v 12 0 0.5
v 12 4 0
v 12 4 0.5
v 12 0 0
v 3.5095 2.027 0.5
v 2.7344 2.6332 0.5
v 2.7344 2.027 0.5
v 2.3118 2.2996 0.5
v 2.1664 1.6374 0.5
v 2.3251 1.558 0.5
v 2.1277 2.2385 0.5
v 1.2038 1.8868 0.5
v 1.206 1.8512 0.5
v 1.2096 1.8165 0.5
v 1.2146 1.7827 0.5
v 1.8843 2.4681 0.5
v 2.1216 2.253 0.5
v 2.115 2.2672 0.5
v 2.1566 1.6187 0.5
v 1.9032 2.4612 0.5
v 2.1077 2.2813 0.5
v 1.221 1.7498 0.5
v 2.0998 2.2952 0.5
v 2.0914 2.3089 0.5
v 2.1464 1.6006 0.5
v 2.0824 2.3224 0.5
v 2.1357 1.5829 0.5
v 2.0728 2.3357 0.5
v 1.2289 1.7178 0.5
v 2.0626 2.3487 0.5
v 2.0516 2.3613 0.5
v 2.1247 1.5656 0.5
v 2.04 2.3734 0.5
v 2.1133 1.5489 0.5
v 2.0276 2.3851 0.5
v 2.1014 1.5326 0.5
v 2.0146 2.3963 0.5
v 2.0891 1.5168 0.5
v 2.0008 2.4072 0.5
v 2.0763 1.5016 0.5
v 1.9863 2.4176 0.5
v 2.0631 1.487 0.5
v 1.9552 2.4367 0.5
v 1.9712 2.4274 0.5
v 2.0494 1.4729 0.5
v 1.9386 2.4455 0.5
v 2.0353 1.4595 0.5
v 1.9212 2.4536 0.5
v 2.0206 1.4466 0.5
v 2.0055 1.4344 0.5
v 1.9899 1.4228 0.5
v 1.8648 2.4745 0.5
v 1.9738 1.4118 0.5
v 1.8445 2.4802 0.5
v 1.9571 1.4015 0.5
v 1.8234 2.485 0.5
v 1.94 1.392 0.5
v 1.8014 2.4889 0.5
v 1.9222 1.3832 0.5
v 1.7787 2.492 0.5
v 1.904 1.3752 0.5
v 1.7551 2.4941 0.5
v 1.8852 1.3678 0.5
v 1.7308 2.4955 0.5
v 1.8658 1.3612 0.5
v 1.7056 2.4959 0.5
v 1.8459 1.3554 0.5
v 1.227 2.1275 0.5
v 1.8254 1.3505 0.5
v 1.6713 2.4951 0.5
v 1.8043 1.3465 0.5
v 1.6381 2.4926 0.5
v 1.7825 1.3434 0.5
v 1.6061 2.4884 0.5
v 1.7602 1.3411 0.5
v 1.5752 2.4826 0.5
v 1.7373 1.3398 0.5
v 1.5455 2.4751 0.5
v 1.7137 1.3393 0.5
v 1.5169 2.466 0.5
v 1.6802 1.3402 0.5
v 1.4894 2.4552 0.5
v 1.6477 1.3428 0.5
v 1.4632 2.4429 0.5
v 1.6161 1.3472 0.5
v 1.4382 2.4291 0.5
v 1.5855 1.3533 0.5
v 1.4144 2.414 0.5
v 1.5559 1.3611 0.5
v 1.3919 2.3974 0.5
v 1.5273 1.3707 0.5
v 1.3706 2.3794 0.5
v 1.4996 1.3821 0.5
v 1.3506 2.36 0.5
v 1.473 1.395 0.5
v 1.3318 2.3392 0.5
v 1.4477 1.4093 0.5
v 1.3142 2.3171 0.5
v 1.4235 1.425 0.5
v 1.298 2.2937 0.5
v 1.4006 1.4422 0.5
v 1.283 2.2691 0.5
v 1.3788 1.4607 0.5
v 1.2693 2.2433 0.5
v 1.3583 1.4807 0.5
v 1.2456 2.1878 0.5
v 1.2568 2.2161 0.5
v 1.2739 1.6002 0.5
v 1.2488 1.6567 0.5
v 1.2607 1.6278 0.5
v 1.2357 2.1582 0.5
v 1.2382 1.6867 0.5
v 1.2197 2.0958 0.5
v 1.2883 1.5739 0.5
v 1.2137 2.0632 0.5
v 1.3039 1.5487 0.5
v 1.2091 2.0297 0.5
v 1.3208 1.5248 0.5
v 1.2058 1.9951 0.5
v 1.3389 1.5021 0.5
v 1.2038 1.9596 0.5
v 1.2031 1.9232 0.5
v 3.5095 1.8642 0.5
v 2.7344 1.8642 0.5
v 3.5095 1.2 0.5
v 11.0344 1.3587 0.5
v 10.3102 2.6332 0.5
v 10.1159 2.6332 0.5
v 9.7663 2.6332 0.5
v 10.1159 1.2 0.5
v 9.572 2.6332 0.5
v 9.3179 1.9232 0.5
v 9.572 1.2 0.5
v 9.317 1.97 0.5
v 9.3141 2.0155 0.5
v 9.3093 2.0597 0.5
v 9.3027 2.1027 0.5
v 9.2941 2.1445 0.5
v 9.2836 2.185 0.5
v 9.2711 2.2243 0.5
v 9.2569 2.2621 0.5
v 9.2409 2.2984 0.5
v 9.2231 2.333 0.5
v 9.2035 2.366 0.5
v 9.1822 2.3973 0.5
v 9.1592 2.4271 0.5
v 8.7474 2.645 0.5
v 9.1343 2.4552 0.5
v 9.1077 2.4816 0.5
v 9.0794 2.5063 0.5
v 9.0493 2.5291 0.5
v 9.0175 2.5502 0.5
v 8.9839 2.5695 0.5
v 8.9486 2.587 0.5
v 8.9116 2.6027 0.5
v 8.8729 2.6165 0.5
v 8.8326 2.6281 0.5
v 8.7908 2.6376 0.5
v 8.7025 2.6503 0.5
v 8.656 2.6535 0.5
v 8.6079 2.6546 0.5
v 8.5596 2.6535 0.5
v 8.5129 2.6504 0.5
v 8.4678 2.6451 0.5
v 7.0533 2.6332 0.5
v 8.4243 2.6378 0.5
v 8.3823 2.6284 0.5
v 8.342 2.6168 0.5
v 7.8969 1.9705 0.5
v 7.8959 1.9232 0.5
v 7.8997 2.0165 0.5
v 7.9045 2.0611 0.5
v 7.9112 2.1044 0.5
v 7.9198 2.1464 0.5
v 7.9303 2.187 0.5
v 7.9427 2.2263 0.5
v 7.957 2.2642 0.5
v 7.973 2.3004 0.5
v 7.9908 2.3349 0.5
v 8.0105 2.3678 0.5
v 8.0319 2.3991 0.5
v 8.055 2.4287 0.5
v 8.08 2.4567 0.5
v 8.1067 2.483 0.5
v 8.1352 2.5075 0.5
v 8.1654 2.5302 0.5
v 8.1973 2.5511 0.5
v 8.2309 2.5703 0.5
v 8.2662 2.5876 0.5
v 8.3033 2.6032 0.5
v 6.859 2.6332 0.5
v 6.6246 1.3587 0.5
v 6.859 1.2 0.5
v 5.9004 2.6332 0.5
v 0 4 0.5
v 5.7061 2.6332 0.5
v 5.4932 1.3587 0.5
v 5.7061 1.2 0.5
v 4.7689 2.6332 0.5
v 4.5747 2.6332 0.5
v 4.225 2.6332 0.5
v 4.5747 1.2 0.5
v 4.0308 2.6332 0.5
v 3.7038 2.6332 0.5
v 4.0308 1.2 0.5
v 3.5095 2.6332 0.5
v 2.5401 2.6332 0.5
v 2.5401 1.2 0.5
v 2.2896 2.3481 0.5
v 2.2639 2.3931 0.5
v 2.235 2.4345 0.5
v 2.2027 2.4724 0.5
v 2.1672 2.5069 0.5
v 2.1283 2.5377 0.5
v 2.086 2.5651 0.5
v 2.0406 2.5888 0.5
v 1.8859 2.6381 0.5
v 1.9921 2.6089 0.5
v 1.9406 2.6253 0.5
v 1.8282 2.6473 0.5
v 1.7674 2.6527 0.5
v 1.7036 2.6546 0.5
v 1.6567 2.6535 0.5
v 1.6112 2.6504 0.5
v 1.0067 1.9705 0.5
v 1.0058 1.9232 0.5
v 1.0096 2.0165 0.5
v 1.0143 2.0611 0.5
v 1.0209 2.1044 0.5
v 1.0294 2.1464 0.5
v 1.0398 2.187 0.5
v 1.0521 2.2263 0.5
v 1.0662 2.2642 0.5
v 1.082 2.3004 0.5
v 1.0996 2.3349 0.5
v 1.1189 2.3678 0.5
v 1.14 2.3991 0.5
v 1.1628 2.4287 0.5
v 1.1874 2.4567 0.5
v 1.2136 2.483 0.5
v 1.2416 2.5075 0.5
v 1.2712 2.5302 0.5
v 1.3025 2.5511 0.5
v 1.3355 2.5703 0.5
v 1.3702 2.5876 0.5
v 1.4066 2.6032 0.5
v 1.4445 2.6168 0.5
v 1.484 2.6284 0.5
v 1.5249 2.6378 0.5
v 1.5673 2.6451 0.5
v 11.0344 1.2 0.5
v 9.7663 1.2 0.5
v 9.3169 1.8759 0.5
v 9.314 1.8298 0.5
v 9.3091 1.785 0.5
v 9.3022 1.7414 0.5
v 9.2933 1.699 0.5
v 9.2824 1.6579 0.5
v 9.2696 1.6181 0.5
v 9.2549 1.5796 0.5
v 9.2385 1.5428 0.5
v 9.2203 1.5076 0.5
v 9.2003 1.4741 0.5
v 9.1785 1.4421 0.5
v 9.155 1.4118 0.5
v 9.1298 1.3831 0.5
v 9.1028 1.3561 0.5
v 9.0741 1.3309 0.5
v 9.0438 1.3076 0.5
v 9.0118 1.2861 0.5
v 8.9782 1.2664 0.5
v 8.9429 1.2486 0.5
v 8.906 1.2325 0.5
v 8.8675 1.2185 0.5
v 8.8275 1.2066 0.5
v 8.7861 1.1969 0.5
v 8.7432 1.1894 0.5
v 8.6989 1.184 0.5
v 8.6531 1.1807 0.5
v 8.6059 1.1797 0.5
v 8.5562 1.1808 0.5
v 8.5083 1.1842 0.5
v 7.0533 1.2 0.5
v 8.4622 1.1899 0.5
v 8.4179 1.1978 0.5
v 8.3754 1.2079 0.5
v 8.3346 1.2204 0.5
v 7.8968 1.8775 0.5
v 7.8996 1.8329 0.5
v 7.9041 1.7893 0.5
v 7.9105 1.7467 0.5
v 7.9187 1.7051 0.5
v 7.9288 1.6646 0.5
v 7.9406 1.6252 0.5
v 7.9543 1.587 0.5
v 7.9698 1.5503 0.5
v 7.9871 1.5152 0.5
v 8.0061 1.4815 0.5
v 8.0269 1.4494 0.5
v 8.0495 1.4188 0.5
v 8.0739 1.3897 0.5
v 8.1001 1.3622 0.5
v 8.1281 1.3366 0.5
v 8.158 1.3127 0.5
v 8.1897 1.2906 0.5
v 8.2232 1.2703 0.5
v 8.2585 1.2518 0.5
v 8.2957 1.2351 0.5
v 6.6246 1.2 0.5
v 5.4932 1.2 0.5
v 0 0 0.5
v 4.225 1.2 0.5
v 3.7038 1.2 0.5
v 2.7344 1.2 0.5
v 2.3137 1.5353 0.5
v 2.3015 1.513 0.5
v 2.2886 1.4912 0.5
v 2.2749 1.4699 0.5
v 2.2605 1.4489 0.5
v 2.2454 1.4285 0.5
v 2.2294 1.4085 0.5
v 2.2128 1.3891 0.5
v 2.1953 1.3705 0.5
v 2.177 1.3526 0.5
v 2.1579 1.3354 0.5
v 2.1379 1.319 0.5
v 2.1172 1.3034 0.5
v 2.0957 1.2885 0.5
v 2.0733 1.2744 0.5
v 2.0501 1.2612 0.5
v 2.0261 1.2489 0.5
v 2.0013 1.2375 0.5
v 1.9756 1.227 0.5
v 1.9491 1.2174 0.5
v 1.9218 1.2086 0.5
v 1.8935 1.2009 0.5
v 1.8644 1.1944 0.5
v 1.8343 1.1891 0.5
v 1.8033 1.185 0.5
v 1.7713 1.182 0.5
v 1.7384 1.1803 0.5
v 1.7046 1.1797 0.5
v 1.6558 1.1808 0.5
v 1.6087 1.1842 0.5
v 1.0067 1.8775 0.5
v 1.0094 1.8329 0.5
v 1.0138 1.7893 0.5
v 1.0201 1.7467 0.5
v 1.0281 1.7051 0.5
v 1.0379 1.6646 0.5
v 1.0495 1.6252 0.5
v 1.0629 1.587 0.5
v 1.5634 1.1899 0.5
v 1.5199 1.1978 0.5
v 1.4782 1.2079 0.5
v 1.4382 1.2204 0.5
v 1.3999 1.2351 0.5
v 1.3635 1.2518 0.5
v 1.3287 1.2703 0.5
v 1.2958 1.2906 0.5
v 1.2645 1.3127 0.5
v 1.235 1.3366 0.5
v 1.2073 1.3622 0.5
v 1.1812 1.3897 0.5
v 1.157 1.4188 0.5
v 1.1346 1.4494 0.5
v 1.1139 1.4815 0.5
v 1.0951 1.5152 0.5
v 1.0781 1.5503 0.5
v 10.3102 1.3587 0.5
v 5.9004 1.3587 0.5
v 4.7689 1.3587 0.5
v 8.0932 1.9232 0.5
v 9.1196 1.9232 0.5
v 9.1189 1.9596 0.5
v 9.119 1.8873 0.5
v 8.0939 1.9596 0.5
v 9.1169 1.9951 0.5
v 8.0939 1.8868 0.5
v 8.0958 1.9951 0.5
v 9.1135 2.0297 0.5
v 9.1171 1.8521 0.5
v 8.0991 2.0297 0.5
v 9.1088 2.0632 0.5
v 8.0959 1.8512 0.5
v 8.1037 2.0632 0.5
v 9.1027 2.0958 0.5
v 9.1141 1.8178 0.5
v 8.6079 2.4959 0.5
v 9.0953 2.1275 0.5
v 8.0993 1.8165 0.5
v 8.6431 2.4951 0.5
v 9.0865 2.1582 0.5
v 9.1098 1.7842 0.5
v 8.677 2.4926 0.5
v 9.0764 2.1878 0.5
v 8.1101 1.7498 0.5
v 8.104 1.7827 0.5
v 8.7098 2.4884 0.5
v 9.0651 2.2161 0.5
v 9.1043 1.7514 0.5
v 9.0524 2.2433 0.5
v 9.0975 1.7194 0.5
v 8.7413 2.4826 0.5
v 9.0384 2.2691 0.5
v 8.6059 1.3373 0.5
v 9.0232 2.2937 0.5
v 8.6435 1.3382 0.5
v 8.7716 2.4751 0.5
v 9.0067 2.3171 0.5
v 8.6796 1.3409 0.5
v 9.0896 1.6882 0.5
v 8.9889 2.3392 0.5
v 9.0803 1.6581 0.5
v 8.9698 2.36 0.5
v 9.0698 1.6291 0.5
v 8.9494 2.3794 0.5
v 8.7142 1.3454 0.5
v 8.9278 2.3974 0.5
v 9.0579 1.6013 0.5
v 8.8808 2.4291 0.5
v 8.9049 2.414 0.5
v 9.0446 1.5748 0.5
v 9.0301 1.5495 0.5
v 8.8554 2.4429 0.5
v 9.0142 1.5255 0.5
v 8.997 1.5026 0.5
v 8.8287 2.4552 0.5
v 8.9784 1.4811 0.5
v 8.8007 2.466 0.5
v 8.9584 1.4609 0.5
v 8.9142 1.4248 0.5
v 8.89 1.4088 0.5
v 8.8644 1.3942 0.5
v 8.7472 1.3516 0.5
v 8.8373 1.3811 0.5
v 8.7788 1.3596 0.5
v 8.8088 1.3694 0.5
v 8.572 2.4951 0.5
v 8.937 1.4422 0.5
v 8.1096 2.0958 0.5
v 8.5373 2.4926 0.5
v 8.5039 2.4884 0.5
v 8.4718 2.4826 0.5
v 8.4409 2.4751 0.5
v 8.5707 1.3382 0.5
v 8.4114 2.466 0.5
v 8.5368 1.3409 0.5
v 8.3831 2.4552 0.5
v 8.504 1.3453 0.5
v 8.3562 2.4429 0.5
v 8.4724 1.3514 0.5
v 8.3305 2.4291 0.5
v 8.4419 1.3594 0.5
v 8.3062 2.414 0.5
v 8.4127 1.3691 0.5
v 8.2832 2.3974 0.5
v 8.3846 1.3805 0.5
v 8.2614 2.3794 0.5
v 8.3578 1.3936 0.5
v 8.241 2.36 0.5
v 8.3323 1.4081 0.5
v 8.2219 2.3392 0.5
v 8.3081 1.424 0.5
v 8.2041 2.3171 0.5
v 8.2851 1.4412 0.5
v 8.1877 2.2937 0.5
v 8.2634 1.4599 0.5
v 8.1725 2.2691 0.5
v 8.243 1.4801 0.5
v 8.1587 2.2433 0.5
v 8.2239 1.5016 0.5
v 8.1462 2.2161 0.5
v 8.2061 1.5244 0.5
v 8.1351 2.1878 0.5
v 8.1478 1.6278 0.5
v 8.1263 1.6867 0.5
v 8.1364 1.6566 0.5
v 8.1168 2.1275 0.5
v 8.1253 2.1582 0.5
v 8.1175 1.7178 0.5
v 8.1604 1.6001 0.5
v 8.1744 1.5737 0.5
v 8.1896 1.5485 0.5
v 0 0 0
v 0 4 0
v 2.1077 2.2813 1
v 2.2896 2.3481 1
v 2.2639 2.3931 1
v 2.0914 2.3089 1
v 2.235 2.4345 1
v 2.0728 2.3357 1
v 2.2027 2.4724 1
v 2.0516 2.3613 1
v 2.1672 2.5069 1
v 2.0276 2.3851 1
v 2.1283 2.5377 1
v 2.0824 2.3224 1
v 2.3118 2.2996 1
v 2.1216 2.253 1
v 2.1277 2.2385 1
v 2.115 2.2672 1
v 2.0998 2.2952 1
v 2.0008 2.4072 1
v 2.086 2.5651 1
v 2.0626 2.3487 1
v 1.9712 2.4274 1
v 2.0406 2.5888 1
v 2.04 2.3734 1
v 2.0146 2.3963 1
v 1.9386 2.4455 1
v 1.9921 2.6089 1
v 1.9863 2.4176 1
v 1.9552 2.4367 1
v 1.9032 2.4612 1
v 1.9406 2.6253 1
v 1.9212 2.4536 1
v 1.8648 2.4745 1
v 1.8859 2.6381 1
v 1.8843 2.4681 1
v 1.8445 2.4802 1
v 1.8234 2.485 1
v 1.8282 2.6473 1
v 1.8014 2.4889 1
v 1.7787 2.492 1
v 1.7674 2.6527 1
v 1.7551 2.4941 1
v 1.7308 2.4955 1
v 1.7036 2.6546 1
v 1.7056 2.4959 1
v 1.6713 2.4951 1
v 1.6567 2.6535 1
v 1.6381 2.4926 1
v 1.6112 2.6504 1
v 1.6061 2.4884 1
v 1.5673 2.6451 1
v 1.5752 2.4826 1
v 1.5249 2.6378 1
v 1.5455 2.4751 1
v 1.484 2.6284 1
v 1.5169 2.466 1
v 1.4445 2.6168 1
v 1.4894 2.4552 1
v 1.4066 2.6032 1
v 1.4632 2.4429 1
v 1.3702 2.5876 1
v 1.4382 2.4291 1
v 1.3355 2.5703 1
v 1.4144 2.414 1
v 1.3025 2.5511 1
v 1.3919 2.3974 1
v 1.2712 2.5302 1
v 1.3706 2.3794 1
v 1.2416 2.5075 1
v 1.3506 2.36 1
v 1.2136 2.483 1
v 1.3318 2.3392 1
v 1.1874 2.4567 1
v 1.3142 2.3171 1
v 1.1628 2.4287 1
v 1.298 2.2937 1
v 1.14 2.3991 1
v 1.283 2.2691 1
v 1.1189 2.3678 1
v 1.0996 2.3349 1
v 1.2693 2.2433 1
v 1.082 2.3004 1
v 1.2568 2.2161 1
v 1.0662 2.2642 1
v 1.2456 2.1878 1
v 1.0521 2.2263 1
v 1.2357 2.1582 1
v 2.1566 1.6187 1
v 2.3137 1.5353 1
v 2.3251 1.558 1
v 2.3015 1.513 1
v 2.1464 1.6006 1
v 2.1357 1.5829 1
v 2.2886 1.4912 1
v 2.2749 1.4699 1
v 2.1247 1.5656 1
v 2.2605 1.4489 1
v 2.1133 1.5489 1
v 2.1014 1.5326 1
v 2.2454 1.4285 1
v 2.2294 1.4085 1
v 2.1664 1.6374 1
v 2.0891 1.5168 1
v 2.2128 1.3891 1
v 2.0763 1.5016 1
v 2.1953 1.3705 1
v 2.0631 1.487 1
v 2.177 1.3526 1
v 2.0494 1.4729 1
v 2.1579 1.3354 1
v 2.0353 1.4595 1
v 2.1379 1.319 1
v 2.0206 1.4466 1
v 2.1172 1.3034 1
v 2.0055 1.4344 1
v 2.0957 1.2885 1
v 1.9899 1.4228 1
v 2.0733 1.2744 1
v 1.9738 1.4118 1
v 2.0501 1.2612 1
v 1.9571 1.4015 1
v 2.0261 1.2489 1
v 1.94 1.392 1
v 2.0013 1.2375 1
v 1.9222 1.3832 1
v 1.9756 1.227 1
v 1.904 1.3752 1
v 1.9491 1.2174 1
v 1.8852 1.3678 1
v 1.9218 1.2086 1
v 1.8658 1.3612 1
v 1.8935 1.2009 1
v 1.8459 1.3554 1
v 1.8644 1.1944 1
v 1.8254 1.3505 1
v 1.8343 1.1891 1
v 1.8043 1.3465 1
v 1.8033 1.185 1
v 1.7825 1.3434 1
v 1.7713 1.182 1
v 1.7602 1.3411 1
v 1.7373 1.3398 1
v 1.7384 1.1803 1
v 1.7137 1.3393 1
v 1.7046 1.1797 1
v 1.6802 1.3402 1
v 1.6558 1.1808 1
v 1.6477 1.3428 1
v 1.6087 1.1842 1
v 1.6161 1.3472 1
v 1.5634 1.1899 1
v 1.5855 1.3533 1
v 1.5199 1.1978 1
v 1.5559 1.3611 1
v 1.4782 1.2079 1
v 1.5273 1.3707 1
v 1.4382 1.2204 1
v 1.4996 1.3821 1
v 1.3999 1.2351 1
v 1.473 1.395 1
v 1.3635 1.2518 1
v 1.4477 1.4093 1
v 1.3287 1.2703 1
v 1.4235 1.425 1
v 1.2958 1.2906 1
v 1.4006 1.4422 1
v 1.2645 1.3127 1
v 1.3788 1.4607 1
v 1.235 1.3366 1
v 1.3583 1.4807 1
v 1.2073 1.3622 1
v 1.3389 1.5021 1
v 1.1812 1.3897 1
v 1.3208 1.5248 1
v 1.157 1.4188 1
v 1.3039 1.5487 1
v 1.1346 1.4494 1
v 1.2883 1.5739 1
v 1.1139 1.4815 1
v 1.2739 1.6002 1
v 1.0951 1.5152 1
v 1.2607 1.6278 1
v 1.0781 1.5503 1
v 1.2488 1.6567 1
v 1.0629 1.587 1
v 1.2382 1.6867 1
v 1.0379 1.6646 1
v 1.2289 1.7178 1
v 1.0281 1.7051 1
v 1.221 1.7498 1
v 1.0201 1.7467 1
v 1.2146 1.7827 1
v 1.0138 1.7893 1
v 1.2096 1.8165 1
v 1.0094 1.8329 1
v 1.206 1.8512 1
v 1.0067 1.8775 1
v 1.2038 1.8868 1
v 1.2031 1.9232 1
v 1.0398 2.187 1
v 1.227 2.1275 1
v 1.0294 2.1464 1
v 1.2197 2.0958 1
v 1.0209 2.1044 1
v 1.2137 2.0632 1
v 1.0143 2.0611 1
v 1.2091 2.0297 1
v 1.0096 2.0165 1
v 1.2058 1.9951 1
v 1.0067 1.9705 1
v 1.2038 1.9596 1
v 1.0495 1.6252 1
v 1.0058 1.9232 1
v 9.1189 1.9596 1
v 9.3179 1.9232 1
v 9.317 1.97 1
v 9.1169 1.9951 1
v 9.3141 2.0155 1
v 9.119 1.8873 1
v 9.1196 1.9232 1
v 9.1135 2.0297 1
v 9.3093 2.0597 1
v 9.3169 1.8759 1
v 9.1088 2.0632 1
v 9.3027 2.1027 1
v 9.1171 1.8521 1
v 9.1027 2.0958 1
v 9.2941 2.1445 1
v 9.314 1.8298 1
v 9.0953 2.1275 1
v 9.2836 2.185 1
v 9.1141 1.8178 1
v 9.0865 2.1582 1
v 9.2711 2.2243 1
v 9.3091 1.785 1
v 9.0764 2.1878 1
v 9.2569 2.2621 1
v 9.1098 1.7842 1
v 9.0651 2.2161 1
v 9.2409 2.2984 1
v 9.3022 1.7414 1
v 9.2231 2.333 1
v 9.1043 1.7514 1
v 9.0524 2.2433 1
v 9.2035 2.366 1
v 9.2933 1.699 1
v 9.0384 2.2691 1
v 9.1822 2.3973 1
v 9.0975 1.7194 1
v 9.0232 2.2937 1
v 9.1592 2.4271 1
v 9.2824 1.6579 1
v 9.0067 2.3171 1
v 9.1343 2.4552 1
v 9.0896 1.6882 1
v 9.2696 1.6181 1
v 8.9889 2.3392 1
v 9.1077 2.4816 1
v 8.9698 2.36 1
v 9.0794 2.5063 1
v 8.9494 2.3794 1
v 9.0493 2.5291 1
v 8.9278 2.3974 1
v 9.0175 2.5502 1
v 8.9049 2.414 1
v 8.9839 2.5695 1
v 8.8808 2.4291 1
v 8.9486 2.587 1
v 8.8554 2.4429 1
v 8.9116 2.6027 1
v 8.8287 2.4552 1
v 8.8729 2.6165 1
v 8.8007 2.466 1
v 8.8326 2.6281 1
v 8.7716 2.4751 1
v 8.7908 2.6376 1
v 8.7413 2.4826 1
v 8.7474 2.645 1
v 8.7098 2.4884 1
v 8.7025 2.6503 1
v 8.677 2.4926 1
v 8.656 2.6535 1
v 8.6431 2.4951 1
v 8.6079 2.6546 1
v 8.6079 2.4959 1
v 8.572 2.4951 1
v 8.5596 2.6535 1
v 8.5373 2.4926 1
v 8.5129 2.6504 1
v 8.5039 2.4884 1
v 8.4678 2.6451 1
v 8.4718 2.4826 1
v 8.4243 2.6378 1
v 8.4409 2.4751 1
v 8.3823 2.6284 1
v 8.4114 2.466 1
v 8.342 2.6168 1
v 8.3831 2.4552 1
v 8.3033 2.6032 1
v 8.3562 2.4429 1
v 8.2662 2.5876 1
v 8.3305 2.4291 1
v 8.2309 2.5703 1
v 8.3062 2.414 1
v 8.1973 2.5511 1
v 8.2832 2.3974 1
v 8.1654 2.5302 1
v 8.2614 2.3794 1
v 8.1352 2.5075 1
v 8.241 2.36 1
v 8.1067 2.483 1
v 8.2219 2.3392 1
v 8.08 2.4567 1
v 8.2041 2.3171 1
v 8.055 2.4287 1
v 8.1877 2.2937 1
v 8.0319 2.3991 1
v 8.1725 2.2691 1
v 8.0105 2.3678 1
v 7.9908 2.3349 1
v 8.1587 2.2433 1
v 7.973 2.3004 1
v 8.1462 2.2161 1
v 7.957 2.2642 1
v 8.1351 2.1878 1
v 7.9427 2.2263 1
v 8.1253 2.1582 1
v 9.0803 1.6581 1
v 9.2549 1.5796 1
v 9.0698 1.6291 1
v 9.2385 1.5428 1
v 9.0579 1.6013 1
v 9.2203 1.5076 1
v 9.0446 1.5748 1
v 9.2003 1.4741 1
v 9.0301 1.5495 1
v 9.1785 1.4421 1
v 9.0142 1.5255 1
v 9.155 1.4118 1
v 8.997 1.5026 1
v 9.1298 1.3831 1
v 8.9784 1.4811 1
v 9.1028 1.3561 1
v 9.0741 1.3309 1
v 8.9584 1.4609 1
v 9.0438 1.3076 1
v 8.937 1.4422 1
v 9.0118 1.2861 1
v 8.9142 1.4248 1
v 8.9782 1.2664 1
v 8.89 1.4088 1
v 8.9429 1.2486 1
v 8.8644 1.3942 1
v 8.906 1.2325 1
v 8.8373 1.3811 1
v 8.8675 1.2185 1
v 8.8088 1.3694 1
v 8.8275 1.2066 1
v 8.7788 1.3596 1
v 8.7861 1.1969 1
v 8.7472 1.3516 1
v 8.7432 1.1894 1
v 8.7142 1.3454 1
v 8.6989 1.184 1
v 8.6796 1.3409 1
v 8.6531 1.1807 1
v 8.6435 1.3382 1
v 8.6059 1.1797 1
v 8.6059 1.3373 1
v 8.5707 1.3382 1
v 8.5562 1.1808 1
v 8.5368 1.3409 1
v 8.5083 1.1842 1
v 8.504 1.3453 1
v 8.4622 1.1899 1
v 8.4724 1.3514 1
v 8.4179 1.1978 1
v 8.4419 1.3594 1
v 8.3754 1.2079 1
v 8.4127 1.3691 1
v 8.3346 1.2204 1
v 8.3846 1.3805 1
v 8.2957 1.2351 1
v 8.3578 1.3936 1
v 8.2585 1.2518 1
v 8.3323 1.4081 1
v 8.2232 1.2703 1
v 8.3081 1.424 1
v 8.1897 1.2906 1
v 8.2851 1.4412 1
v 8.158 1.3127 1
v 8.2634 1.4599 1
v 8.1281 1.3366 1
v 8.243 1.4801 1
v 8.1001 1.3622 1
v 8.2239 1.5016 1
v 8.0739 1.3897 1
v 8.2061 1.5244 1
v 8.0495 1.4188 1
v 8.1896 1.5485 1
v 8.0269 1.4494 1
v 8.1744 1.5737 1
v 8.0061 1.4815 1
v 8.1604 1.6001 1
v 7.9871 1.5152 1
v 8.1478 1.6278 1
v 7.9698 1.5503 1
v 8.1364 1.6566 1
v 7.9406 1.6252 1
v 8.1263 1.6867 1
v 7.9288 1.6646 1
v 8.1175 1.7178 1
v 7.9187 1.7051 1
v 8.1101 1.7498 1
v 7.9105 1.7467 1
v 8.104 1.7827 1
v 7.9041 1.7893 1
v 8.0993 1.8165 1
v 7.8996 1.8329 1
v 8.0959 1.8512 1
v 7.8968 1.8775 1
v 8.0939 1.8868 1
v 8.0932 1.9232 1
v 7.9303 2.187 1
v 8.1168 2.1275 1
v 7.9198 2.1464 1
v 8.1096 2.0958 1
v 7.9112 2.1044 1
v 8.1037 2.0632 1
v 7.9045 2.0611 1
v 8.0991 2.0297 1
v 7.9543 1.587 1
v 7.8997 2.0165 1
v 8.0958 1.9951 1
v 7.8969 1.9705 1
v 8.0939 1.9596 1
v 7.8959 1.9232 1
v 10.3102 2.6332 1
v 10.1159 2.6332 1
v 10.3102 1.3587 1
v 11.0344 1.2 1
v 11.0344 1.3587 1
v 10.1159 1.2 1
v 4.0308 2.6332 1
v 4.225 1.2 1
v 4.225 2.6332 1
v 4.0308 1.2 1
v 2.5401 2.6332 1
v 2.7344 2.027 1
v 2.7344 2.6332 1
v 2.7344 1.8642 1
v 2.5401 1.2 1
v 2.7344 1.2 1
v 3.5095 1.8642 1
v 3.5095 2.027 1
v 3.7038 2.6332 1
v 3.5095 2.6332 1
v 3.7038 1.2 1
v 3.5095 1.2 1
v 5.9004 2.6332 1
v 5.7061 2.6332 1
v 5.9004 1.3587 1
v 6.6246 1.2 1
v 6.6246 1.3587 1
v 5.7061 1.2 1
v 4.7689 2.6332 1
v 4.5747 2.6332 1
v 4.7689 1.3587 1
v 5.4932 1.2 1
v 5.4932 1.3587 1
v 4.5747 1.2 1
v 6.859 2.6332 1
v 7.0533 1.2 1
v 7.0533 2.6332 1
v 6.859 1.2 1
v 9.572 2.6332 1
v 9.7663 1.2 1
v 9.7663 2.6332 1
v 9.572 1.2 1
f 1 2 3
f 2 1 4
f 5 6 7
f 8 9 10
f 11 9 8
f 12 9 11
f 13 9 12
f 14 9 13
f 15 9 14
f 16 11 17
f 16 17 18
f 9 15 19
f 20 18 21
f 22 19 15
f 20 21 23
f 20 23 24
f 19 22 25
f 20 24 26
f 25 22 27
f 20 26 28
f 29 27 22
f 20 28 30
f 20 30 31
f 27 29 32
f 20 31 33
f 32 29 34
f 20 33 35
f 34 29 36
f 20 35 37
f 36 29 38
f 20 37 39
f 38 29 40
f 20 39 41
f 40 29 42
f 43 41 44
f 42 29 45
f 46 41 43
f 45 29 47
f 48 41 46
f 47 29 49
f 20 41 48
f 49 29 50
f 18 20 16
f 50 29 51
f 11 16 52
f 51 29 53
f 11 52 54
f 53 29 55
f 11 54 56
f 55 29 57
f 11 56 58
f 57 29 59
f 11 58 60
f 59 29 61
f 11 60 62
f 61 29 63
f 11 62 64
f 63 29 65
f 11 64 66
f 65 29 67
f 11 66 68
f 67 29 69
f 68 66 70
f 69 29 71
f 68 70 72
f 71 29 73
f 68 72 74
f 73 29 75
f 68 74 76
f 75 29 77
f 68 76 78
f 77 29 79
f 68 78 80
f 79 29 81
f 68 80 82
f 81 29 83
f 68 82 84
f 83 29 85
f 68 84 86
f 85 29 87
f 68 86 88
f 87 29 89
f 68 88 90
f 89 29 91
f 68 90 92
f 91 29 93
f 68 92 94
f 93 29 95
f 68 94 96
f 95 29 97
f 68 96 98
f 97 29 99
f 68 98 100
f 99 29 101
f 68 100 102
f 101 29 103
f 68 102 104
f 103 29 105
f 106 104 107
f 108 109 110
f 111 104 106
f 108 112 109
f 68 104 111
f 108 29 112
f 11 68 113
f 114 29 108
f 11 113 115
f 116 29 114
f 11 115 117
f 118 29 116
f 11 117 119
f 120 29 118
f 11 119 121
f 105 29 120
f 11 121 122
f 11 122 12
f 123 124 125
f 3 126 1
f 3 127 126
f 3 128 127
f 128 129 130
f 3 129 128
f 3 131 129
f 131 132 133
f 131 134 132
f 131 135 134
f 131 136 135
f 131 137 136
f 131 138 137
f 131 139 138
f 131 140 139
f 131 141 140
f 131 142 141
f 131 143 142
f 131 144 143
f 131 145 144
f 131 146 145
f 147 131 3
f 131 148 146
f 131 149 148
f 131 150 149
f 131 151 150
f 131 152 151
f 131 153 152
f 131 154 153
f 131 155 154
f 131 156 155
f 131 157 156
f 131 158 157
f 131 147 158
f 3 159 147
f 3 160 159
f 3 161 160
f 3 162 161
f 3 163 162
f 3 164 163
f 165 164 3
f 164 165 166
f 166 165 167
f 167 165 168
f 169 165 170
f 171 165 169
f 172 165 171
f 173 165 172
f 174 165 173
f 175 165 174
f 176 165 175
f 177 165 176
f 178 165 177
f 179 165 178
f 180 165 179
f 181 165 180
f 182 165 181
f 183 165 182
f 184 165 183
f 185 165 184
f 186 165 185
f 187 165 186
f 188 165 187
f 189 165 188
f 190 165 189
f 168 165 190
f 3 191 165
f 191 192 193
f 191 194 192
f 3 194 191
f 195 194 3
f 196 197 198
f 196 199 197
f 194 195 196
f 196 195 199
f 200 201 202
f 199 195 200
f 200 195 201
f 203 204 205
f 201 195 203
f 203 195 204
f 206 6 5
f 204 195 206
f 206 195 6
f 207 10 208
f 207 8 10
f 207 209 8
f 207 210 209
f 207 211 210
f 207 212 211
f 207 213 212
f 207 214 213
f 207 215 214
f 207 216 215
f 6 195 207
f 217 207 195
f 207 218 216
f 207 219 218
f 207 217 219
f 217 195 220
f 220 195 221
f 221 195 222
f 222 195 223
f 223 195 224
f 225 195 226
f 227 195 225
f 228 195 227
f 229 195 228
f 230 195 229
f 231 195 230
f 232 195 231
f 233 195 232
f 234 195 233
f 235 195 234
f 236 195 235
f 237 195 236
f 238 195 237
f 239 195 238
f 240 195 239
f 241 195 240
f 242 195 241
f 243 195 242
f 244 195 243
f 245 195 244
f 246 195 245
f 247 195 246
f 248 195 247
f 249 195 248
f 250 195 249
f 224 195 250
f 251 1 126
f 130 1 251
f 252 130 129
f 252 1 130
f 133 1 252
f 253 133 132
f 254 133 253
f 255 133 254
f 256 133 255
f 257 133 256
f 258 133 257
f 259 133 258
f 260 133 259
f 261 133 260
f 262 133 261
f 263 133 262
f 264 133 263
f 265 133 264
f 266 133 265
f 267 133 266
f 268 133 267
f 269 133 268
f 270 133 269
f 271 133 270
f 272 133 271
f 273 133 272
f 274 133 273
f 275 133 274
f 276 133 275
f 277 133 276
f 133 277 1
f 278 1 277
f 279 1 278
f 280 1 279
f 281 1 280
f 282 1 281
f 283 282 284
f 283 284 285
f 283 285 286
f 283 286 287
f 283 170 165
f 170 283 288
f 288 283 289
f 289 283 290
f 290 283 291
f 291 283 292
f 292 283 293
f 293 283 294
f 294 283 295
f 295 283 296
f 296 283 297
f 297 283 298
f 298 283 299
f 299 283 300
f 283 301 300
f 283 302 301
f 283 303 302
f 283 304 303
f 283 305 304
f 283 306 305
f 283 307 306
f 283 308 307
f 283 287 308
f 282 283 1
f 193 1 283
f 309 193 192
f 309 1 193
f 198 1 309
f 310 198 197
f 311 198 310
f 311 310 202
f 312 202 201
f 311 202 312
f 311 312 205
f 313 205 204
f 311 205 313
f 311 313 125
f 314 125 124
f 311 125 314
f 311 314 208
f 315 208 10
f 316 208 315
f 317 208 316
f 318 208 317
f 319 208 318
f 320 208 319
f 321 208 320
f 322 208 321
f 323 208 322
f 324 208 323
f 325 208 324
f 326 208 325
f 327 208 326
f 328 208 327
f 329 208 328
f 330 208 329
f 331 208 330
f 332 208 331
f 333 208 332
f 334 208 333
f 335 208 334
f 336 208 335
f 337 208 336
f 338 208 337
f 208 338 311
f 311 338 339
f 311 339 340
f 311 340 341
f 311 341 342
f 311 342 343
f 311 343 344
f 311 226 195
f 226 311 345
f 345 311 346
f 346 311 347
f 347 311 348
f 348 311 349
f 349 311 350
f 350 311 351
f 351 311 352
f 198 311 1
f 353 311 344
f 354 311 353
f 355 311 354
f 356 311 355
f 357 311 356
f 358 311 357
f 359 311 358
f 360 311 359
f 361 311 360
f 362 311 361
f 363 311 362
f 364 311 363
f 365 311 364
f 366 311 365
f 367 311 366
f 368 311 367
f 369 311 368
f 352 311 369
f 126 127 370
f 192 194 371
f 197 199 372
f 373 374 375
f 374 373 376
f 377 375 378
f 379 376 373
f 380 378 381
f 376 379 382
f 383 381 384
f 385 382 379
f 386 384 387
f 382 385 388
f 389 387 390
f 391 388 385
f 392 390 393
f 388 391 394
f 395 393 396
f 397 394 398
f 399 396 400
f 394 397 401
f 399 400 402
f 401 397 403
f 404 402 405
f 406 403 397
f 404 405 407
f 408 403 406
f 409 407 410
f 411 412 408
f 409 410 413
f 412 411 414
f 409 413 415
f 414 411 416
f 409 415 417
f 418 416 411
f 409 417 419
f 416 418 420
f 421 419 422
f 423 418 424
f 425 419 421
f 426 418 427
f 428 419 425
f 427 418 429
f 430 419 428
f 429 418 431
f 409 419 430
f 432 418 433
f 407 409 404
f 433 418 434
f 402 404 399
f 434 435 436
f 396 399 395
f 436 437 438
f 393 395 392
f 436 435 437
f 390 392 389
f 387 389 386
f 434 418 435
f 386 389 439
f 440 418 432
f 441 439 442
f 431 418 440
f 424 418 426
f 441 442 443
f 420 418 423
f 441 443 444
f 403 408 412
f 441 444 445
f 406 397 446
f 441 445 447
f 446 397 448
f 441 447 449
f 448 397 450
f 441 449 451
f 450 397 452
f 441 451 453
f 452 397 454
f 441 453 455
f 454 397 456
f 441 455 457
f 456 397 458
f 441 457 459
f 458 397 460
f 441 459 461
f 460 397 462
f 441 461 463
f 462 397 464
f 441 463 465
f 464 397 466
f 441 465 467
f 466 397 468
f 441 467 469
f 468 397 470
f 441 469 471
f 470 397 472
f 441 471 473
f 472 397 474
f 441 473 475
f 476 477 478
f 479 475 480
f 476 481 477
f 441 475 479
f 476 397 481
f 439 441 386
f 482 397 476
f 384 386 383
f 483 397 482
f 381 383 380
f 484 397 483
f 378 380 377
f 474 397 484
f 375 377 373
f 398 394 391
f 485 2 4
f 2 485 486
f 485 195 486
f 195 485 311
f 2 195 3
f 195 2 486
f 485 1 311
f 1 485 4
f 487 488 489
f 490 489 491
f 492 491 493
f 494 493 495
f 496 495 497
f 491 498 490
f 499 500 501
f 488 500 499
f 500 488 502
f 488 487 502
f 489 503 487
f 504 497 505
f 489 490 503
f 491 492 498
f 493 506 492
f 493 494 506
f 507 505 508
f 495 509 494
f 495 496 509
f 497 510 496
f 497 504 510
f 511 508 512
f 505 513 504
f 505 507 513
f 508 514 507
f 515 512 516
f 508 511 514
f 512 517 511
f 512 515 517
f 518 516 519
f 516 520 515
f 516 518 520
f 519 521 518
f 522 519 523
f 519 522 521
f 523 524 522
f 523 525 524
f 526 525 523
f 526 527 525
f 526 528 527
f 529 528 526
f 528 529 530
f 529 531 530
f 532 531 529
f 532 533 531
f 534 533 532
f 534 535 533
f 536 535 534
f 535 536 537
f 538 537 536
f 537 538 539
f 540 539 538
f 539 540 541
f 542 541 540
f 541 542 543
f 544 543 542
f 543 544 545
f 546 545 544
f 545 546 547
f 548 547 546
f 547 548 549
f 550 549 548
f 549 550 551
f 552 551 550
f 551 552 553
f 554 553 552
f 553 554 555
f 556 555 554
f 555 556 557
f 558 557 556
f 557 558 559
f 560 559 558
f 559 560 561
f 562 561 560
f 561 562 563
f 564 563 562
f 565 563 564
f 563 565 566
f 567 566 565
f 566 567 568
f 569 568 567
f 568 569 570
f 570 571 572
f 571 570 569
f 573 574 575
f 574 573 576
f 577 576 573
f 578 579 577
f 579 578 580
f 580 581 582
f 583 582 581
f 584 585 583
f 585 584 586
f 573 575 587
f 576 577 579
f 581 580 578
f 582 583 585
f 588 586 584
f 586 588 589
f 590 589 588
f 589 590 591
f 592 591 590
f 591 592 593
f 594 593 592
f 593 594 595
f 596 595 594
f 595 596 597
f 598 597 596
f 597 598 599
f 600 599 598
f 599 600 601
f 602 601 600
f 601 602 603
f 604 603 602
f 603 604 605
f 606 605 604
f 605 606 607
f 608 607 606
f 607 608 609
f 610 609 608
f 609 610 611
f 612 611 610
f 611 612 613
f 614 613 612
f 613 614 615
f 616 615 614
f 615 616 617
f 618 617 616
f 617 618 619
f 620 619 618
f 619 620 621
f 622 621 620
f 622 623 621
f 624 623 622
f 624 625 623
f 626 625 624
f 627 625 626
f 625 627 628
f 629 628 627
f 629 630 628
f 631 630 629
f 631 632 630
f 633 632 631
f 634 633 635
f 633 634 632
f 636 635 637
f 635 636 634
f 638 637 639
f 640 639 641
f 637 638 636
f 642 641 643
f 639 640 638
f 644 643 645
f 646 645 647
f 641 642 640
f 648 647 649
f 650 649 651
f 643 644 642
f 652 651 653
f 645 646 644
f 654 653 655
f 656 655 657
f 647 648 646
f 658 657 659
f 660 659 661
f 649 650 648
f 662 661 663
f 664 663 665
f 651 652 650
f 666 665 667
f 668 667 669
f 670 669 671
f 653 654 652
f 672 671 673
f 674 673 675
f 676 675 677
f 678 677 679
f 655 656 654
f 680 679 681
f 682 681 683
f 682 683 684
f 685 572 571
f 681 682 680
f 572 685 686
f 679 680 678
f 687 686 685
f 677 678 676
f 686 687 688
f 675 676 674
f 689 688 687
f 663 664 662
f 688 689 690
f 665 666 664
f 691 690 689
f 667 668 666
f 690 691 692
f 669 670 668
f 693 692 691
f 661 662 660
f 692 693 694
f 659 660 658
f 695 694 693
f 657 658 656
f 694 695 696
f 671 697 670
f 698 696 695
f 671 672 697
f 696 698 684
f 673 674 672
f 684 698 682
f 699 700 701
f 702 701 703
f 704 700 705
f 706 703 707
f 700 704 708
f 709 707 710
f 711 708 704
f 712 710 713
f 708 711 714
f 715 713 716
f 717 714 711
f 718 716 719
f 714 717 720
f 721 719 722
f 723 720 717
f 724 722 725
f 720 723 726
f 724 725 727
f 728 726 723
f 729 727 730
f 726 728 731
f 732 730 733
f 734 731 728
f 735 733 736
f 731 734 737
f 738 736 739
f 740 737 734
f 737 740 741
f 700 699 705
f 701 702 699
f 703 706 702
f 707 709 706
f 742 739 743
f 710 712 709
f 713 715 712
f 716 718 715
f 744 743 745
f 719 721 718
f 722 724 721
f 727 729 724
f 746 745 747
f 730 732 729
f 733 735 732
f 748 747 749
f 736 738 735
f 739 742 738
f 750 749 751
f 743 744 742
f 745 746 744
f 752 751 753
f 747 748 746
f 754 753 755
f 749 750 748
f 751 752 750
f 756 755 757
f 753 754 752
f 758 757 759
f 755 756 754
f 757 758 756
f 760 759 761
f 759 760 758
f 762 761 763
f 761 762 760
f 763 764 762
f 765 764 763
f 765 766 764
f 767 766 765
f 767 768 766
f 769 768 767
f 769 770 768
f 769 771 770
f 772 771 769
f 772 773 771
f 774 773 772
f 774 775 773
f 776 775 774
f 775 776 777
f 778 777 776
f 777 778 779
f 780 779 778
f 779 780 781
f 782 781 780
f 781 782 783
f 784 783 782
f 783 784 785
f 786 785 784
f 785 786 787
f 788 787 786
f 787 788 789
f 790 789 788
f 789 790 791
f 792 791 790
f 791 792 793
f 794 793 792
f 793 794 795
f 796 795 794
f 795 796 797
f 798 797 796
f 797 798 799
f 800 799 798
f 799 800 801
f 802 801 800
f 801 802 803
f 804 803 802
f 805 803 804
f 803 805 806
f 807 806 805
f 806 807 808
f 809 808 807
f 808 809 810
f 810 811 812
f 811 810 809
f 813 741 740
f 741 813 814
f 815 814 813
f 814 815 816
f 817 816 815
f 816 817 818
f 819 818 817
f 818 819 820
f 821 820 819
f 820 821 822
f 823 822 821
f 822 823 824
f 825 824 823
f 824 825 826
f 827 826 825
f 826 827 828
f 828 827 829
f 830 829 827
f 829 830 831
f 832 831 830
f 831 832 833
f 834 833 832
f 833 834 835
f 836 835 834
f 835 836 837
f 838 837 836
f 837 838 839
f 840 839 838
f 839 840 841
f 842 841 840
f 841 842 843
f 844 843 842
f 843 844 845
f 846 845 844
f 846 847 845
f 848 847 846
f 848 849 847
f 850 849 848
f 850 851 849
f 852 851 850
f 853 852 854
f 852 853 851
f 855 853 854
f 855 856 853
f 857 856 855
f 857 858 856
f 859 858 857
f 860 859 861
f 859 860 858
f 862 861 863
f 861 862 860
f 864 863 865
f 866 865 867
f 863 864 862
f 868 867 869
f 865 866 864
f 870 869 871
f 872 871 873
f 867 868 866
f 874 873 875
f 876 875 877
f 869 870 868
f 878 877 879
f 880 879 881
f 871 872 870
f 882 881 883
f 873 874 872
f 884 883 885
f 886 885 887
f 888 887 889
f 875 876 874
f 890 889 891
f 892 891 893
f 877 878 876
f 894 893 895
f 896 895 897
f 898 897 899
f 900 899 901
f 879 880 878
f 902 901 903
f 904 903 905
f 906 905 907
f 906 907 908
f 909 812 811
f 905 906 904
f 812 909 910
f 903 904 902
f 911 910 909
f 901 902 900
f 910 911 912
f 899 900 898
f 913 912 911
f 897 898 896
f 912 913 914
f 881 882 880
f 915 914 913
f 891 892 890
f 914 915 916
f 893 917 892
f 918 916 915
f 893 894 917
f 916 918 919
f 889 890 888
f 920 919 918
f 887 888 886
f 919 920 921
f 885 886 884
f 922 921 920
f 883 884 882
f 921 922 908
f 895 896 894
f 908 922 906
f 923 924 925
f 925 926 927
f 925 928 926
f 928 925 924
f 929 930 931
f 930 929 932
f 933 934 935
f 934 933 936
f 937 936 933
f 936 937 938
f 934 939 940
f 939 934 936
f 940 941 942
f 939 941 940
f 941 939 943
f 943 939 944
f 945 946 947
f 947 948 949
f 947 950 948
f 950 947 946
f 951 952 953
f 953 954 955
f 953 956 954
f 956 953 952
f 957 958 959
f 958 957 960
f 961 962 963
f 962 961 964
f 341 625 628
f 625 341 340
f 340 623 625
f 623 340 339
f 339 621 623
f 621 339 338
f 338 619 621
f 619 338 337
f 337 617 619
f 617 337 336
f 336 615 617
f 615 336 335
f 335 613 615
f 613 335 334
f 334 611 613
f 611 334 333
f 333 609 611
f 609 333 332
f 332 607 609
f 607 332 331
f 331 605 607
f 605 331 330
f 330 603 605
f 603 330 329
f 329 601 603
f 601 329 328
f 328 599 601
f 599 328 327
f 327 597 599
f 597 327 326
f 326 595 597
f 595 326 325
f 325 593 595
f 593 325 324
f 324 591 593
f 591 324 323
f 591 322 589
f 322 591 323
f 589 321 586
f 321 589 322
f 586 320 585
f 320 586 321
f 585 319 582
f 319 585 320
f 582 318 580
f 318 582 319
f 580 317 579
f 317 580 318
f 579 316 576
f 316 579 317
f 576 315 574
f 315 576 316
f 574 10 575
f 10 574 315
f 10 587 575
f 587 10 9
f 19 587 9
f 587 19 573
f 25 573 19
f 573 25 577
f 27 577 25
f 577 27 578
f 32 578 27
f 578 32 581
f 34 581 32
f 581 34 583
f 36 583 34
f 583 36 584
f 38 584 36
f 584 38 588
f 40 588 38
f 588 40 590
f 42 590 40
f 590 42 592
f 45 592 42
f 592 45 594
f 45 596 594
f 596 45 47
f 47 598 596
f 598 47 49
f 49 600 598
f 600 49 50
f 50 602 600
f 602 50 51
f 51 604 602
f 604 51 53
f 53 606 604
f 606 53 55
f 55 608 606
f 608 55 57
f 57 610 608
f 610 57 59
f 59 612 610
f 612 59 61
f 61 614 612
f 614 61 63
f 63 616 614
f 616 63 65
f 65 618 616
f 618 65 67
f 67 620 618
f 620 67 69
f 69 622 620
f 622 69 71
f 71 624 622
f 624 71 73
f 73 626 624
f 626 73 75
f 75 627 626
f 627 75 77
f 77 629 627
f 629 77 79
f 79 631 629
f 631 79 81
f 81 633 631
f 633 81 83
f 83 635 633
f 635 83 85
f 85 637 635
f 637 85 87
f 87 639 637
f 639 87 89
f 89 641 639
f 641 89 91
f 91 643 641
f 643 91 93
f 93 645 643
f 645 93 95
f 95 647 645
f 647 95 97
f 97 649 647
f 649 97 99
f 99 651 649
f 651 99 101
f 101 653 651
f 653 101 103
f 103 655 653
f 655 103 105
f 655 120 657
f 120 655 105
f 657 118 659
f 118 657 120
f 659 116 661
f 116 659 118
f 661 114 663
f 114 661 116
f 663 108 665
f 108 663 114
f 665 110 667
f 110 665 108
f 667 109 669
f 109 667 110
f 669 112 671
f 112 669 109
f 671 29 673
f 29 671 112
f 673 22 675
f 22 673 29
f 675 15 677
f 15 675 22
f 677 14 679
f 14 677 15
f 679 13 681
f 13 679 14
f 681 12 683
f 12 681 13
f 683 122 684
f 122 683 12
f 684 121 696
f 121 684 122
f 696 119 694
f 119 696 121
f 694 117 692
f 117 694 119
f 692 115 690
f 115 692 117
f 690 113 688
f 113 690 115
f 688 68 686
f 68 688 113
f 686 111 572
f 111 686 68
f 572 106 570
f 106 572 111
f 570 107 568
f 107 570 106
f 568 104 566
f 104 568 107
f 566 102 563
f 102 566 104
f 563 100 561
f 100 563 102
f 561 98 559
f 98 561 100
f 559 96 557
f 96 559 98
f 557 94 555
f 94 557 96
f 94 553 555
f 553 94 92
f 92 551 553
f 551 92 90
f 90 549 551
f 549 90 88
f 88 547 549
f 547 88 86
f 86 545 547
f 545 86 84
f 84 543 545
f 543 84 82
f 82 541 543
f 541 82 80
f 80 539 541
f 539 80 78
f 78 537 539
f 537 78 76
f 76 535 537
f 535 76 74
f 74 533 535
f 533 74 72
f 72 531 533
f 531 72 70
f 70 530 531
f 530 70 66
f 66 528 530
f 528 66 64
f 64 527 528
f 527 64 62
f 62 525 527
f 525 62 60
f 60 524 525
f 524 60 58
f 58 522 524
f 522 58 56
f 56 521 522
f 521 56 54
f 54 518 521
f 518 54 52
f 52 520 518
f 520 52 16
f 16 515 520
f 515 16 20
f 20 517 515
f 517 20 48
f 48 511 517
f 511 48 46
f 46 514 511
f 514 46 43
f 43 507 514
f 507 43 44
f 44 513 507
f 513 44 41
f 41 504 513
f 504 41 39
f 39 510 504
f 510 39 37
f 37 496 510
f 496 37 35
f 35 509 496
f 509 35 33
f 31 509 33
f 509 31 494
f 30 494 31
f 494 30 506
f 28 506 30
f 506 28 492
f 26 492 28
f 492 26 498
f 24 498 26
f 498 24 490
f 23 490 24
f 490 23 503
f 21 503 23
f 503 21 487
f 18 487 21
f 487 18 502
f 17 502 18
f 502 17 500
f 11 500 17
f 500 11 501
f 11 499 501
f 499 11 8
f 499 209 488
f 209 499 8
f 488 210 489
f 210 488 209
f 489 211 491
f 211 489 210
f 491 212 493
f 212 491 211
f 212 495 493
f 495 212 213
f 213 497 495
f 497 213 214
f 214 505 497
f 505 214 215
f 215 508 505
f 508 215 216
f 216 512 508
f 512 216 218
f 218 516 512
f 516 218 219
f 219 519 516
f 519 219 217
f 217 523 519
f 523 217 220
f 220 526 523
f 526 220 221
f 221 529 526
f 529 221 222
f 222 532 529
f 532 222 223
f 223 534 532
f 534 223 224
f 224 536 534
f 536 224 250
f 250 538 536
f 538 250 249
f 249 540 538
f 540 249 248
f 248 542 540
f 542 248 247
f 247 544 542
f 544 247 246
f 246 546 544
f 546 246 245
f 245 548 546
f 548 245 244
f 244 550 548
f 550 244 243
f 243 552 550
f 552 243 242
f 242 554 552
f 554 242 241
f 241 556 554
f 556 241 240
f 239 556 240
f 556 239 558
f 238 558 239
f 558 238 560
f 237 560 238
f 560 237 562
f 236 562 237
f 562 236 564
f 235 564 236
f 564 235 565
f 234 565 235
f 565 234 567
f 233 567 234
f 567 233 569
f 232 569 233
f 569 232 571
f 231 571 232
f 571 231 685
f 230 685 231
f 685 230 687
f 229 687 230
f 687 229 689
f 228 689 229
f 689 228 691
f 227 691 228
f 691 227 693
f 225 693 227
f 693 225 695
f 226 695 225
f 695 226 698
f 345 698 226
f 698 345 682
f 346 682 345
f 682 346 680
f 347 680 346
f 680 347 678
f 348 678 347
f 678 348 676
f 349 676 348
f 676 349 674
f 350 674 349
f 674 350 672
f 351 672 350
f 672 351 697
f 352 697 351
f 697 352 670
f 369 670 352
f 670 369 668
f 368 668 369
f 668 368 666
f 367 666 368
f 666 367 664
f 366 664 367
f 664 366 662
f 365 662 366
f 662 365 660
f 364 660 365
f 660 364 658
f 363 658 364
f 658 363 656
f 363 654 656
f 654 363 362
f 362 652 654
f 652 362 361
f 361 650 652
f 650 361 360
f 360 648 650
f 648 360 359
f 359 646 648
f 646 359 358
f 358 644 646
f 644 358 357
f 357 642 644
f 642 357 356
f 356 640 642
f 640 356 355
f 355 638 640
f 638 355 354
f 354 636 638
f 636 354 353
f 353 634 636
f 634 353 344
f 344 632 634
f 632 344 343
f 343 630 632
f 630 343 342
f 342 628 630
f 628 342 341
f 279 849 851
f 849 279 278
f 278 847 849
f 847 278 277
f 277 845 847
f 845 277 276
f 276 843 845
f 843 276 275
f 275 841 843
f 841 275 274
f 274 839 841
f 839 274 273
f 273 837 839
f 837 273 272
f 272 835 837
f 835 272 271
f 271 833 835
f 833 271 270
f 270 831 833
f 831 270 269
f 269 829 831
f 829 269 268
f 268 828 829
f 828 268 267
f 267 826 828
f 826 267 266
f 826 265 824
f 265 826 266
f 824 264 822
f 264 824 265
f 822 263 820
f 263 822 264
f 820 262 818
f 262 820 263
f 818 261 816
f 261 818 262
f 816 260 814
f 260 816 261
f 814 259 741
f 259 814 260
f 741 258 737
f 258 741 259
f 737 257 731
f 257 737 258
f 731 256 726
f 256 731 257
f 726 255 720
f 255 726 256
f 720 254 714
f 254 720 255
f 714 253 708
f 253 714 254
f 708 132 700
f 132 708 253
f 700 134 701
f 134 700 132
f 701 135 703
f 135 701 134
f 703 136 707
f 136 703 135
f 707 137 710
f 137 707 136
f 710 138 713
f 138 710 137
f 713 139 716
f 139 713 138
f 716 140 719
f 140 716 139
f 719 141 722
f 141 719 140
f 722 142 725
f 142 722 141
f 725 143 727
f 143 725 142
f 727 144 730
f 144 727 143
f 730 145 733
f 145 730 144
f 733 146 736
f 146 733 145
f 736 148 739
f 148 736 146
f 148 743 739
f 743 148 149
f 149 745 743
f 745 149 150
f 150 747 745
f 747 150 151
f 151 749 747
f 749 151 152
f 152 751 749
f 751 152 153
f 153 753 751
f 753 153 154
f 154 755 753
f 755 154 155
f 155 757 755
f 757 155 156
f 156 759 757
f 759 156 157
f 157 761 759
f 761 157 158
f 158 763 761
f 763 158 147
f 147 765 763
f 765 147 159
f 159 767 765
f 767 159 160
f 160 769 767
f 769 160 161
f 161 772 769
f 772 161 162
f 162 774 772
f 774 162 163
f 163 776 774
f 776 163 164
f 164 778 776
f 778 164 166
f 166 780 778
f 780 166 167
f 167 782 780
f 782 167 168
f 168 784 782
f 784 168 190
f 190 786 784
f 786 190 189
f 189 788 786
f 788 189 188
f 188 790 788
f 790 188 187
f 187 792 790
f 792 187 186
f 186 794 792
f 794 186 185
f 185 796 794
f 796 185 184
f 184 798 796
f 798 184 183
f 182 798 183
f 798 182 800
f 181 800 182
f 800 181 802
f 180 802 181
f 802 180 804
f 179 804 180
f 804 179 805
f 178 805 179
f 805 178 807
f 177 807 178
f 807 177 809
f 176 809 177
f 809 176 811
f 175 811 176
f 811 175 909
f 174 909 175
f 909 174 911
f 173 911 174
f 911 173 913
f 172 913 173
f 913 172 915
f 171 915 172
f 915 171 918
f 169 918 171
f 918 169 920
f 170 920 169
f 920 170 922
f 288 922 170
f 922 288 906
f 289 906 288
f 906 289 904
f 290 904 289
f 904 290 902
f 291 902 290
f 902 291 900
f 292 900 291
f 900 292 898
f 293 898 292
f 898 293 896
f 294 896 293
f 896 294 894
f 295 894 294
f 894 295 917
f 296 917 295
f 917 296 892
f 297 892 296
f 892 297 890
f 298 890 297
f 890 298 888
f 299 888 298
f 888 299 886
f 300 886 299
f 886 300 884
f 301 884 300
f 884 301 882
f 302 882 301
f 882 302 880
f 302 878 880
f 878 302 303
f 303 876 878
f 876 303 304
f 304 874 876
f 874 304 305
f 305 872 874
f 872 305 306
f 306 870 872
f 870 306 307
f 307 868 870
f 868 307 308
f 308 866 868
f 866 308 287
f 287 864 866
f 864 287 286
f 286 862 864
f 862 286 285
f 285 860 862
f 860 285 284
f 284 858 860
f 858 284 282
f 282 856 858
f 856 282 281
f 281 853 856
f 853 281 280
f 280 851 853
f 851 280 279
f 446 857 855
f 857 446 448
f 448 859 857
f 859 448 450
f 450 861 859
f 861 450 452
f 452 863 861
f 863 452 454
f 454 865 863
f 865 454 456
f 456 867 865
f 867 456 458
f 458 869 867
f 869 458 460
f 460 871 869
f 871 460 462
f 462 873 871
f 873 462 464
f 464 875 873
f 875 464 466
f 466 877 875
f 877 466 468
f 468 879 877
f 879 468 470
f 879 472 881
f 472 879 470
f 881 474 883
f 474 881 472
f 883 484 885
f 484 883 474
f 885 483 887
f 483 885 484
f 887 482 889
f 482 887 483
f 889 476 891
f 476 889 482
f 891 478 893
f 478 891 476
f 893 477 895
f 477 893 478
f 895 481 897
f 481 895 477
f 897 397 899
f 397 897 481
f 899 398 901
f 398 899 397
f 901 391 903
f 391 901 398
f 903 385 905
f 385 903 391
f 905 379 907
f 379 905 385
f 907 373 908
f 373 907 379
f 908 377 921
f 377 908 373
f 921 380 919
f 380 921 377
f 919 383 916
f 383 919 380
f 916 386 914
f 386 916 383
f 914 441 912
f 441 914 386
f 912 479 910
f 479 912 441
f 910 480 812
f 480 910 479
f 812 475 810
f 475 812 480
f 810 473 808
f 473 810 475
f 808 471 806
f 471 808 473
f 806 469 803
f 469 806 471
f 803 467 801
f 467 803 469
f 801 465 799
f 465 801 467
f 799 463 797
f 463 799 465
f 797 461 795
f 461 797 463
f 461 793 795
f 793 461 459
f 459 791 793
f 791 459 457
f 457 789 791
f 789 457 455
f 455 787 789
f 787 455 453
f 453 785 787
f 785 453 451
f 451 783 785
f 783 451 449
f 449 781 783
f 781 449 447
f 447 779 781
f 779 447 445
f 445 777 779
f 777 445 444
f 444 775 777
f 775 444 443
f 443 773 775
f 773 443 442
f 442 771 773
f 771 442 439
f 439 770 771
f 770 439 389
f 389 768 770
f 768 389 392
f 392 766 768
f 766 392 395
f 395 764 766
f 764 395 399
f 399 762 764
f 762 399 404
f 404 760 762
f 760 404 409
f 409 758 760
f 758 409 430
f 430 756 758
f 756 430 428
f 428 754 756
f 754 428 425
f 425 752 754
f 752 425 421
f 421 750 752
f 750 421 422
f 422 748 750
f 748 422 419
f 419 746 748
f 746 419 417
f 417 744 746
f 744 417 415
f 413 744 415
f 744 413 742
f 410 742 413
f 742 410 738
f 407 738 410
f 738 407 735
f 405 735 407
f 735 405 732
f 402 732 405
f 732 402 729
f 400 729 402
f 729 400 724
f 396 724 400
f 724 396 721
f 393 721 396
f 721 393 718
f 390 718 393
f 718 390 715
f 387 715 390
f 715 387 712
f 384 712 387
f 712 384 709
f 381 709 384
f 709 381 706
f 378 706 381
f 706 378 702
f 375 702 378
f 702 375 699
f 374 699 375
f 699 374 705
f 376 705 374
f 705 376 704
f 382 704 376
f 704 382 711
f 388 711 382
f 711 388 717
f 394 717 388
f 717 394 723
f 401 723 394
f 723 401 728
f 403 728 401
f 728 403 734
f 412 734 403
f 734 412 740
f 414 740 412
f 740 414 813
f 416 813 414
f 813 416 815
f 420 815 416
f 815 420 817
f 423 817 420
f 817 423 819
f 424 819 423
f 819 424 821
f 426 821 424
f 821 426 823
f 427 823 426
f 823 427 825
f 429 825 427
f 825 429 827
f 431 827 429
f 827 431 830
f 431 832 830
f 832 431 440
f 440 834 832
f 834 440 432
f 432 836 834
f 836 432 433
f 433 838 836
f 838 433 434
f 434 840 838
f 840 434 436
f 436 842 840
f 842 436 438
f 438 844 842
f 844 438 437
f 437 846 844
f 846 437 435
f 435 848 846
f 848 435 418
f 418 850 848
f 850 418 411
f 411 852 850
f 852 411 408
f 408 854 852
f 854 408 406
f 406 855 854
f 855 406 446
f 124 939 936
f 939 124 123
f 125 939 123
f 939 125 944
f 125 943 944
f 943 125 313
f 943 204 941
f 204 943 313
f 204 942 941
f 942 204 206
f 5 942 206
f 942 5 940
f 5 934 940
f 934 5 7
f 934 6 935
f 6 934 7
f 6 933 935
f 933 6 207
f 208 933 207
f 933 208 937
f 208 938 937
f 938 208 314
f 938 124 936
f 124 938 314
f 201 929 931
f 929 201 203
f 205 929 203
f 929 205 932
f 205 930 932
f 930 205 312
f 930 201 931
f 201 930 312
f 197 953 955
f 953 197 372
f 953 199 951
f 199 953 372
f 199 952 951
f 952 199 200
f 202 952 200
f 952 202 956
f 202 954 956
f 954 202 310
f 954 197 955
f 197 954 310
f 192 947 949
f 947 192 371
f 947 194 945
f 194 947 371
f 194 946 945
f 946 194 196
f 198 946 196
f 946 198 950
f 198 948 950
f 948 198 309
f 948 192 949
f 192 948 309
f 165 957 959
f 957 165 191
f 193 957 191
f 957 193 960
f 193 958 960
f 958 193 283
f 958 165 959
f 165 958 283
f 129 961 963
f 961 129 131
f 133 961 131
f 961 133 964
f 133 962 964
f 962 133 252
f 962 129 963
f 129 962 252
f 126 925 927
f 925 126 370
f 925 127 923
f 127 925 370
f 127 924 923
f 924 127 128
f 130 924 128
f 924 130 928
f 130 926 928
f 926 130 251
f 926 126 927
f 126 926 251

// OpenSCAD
$fn=50;
cube([12, 4, 0.5]);
translate([0.9, 1.2, 0])
    linear_extrude(1)
        text("CHILLI OIL", size = 1.5);
